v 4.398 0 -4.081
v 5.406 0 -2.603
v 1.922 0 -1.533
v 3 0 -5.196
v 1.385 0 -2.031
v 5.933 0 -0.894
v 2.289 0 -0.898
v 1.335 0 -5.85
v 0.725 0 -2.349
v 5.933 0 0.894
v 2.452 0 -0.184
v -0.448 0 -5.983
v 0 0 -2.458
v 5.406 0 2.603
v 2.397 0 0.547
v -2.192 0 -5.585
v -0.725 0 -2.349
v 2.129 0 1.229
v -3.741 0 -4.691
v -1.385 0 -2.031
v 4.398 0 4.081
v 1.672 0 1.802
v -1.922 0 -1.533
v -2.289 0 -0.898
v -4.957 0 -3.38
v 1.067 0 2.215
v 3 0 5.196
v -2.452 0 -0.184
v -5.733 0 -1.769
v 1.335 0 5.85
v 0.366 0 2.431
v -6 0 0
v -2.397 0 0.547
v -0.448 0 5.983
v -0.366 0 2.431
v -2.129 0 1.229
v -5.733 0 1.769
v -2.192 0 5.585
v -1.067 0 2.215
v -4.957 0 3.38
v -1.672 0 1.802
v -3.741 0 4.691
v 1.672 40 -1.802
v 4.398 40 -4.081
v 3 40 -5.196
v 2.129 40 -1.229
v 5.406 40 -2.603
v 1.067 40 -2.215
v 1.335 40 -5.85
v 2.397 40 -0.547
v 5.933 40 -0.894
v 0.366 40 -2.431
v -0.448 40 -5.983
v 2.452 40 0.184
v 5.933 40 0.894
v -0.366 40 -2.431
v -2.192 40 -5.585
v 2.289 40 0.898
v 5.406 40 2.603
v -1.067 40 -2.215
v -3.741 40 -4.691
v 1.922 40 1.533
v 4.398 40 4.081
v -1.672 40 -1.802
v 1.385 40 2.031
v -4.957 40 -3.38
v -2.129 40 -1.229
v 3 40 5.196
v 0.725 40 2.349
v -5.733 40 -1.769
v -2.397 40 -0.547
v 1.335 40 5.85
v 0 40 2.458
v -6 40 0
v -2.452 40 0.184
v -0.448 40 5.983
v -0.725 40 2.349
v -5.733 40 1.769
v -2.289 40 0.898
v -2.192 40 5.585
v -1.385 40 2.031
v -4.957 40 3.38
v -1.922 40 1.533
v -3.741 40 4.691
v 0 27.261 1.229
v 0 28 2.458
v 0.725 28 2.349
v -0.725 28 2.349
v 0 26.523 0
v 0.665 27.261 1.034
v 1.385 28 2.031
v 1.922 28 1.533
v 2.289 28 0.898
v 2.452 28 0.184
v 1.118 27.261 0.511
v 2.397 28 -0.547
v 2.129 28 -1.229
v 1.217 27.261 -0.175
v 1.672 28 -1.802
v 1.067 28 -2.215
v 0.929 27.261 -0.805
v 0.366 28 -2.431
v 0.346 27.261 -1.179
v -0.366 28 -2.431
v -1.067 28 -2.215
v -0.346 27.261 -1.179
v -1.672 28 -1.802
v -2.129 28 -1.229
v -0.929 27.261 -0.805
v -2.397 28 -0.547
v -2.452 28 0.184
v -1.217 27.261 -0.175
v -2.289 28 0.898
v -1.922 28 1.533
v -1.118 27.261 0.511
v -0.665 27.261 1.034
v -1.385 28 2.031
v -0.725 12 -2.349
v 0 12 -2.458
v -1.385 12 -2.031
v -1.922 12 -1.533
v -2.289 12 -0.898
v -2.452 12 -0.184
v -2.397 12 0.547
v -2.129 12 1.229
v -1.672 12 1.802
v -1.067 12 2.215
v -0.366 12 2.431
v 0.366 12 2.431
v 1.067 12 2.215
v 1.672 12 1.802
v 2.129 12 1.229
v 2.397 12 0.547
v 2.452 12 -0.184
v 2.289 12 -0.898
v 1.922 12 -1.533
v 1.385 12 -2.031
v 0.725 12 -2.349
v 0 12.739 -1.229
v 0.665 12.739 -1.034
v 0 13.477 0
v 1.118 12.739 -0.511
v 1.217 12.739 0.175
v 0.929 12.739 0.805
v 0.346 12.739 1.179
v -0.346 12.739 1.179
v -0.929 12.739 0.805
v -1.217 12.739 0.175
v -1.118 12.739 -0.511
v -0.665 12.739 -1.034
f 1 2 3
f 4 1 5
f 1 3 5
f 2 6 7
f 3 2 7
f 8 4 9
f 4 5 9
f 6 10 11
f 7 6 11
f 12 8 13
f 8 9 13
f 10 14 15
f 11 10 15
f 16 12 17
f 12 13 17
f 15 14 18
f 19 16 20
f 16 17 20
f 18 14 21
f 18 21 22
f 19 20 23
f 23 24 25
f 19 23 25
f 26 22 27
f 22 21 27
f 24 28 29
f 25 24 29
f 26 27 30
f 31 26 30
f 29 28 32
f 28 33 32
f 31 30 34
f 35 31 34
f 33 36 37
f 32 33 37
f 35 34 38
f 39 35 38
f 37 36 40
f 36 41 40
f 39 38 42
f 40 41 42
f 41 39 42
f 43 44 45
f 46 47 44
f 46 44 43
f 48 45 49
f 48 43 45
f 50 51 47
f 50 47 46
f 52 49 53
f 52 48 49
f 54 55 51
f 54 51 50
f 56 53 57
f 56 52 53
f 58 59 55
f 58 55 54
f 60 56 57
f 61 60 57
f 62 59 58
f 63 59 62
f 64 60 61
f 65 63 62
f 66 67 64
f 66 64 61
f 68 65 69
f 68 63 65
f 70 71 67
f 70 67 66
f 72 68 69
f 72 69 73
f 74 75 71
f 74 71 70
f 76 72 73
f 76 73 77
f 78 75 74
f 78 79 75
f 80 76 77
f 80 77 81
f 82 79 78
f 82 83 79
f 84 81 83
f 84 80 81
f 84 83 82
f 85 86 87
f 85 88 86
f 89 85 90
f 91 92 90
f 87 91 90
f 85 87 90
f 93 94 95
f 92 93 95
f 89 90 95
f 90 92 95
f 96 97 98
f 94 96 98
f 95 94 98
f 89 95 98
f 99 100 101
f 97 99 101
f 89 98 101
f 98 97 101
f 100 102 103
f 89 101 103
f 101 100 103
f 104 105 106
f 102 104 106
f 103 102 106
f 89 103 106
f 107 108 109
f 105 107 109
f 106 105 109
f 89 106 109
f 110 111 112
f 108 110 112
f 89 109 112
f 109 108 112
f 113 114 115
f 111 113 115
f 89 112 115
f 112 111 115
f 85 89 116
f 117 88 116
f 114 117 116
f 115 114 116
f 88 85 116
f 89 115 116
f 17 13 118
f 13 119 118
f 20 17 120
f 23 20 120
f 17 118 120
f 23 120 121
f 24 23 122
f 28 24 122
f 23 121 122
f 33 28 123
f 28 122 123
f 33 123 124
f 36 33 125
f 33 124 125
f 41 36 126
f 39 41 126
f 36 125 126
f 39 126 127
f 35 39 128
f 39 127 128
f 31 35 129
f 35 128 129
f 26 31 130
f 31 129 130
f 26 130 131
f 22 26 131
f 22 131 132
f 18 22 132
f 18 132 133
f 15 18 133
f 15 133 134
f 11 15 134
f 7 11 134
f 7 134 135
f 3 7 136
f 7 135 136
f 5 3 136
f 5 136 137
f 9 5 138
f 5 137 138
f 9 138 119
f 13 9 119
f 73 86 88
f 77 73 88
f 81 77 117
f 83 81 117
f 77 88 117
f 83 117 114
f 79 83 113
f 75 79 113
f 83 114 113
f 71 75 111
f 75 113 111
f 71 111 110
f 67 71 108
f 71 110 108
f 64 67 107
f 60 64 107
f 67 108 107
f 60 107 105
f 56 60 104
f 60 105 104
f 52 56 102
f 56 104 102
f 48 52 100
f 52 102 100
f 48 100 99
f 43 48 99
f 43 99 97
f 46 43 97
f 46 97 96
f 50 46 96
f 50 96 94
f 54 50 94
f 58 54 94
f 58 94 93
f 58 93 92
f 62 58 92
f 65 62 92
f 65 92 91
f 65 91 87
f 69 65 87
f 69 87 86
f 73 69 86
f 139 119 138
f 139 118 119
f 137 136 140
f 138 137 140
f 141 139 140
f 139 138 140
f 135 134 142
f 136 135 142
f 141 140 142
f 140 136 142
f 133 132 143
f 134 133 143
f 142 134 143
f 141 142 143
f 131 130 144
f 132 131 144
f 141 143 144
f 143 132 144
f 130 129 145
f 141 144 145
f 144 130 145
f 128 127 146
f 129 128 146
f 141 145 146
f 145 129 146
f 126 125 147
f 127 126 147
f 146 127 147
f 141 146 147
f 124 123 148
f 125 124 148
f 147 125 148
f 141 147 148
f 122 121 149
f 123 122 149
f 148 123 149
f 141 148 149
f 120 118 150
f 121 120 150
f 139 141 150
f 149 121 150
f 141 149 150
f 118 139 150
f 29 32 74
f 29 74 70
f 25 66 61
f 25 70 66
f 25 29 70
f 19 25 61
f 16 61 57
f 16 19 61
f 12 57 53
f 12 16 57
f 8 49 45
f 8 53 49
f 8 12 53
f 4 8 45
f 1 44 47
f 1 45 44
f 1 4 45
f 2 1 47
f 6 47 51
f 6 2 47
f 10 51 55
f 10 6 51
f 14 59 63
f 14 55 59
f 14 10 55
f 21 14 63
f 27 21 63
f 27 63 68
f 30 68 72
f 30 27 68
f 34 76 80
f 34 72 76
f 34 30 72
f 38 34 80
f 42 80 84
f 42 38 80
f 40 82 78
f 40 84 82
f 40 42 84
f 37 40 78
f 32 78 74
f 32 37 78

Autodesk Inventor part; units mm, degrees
ref_plane "YZ Plane" through (0, 0, 0) normal (1, 0, 0) x (0, 1, 0)
ref_plane "XZ Plane" through (0, 0, 0) normal (0, 1, 0) x (-1, 0, 0)
ref_plane "XY Plane" through (0, 0, 0) normal (0, 0, 1) x (1, 0, 0)
sketch "スケッチ1" plane through (0, 0, 0) normal (0, 1, 0) x (-1, 0, 0)
  circle A0 centre (0, 0) radius 6
  dimension "d0" = 12
extrude "押し出し1" add sketch "スケッチ1" along normal blind 40
sketch "スケッチ2" plane through (0, 40, 0) normal (0, 1, 0) x (1, 0, 0)
  point P0 (0, 0)
  point P1 (0, 0)
hole "穴1" at (0, 40, 0) direction (0, -1, 0) diameter 4.917 depth 12 tip angle 118 thread size "M6x1" class "6H" standard "ISO Metric profile"
sketch "スケッチ3" plane through (0, 0, 0) normal (0, -1, 0) x (1, 0, 0)
  circle A0 centre (0, 0) radius 2.4585 projected
hole "穴2" at (0, 0, 0) direction (0, 1, 0) diameter 4.917 depth 12 tip angle 118 thread size "M6x1" class "6H" standard "ISO Metric profile"
properties part number "base_part5" material "アルミニウム 6061"
